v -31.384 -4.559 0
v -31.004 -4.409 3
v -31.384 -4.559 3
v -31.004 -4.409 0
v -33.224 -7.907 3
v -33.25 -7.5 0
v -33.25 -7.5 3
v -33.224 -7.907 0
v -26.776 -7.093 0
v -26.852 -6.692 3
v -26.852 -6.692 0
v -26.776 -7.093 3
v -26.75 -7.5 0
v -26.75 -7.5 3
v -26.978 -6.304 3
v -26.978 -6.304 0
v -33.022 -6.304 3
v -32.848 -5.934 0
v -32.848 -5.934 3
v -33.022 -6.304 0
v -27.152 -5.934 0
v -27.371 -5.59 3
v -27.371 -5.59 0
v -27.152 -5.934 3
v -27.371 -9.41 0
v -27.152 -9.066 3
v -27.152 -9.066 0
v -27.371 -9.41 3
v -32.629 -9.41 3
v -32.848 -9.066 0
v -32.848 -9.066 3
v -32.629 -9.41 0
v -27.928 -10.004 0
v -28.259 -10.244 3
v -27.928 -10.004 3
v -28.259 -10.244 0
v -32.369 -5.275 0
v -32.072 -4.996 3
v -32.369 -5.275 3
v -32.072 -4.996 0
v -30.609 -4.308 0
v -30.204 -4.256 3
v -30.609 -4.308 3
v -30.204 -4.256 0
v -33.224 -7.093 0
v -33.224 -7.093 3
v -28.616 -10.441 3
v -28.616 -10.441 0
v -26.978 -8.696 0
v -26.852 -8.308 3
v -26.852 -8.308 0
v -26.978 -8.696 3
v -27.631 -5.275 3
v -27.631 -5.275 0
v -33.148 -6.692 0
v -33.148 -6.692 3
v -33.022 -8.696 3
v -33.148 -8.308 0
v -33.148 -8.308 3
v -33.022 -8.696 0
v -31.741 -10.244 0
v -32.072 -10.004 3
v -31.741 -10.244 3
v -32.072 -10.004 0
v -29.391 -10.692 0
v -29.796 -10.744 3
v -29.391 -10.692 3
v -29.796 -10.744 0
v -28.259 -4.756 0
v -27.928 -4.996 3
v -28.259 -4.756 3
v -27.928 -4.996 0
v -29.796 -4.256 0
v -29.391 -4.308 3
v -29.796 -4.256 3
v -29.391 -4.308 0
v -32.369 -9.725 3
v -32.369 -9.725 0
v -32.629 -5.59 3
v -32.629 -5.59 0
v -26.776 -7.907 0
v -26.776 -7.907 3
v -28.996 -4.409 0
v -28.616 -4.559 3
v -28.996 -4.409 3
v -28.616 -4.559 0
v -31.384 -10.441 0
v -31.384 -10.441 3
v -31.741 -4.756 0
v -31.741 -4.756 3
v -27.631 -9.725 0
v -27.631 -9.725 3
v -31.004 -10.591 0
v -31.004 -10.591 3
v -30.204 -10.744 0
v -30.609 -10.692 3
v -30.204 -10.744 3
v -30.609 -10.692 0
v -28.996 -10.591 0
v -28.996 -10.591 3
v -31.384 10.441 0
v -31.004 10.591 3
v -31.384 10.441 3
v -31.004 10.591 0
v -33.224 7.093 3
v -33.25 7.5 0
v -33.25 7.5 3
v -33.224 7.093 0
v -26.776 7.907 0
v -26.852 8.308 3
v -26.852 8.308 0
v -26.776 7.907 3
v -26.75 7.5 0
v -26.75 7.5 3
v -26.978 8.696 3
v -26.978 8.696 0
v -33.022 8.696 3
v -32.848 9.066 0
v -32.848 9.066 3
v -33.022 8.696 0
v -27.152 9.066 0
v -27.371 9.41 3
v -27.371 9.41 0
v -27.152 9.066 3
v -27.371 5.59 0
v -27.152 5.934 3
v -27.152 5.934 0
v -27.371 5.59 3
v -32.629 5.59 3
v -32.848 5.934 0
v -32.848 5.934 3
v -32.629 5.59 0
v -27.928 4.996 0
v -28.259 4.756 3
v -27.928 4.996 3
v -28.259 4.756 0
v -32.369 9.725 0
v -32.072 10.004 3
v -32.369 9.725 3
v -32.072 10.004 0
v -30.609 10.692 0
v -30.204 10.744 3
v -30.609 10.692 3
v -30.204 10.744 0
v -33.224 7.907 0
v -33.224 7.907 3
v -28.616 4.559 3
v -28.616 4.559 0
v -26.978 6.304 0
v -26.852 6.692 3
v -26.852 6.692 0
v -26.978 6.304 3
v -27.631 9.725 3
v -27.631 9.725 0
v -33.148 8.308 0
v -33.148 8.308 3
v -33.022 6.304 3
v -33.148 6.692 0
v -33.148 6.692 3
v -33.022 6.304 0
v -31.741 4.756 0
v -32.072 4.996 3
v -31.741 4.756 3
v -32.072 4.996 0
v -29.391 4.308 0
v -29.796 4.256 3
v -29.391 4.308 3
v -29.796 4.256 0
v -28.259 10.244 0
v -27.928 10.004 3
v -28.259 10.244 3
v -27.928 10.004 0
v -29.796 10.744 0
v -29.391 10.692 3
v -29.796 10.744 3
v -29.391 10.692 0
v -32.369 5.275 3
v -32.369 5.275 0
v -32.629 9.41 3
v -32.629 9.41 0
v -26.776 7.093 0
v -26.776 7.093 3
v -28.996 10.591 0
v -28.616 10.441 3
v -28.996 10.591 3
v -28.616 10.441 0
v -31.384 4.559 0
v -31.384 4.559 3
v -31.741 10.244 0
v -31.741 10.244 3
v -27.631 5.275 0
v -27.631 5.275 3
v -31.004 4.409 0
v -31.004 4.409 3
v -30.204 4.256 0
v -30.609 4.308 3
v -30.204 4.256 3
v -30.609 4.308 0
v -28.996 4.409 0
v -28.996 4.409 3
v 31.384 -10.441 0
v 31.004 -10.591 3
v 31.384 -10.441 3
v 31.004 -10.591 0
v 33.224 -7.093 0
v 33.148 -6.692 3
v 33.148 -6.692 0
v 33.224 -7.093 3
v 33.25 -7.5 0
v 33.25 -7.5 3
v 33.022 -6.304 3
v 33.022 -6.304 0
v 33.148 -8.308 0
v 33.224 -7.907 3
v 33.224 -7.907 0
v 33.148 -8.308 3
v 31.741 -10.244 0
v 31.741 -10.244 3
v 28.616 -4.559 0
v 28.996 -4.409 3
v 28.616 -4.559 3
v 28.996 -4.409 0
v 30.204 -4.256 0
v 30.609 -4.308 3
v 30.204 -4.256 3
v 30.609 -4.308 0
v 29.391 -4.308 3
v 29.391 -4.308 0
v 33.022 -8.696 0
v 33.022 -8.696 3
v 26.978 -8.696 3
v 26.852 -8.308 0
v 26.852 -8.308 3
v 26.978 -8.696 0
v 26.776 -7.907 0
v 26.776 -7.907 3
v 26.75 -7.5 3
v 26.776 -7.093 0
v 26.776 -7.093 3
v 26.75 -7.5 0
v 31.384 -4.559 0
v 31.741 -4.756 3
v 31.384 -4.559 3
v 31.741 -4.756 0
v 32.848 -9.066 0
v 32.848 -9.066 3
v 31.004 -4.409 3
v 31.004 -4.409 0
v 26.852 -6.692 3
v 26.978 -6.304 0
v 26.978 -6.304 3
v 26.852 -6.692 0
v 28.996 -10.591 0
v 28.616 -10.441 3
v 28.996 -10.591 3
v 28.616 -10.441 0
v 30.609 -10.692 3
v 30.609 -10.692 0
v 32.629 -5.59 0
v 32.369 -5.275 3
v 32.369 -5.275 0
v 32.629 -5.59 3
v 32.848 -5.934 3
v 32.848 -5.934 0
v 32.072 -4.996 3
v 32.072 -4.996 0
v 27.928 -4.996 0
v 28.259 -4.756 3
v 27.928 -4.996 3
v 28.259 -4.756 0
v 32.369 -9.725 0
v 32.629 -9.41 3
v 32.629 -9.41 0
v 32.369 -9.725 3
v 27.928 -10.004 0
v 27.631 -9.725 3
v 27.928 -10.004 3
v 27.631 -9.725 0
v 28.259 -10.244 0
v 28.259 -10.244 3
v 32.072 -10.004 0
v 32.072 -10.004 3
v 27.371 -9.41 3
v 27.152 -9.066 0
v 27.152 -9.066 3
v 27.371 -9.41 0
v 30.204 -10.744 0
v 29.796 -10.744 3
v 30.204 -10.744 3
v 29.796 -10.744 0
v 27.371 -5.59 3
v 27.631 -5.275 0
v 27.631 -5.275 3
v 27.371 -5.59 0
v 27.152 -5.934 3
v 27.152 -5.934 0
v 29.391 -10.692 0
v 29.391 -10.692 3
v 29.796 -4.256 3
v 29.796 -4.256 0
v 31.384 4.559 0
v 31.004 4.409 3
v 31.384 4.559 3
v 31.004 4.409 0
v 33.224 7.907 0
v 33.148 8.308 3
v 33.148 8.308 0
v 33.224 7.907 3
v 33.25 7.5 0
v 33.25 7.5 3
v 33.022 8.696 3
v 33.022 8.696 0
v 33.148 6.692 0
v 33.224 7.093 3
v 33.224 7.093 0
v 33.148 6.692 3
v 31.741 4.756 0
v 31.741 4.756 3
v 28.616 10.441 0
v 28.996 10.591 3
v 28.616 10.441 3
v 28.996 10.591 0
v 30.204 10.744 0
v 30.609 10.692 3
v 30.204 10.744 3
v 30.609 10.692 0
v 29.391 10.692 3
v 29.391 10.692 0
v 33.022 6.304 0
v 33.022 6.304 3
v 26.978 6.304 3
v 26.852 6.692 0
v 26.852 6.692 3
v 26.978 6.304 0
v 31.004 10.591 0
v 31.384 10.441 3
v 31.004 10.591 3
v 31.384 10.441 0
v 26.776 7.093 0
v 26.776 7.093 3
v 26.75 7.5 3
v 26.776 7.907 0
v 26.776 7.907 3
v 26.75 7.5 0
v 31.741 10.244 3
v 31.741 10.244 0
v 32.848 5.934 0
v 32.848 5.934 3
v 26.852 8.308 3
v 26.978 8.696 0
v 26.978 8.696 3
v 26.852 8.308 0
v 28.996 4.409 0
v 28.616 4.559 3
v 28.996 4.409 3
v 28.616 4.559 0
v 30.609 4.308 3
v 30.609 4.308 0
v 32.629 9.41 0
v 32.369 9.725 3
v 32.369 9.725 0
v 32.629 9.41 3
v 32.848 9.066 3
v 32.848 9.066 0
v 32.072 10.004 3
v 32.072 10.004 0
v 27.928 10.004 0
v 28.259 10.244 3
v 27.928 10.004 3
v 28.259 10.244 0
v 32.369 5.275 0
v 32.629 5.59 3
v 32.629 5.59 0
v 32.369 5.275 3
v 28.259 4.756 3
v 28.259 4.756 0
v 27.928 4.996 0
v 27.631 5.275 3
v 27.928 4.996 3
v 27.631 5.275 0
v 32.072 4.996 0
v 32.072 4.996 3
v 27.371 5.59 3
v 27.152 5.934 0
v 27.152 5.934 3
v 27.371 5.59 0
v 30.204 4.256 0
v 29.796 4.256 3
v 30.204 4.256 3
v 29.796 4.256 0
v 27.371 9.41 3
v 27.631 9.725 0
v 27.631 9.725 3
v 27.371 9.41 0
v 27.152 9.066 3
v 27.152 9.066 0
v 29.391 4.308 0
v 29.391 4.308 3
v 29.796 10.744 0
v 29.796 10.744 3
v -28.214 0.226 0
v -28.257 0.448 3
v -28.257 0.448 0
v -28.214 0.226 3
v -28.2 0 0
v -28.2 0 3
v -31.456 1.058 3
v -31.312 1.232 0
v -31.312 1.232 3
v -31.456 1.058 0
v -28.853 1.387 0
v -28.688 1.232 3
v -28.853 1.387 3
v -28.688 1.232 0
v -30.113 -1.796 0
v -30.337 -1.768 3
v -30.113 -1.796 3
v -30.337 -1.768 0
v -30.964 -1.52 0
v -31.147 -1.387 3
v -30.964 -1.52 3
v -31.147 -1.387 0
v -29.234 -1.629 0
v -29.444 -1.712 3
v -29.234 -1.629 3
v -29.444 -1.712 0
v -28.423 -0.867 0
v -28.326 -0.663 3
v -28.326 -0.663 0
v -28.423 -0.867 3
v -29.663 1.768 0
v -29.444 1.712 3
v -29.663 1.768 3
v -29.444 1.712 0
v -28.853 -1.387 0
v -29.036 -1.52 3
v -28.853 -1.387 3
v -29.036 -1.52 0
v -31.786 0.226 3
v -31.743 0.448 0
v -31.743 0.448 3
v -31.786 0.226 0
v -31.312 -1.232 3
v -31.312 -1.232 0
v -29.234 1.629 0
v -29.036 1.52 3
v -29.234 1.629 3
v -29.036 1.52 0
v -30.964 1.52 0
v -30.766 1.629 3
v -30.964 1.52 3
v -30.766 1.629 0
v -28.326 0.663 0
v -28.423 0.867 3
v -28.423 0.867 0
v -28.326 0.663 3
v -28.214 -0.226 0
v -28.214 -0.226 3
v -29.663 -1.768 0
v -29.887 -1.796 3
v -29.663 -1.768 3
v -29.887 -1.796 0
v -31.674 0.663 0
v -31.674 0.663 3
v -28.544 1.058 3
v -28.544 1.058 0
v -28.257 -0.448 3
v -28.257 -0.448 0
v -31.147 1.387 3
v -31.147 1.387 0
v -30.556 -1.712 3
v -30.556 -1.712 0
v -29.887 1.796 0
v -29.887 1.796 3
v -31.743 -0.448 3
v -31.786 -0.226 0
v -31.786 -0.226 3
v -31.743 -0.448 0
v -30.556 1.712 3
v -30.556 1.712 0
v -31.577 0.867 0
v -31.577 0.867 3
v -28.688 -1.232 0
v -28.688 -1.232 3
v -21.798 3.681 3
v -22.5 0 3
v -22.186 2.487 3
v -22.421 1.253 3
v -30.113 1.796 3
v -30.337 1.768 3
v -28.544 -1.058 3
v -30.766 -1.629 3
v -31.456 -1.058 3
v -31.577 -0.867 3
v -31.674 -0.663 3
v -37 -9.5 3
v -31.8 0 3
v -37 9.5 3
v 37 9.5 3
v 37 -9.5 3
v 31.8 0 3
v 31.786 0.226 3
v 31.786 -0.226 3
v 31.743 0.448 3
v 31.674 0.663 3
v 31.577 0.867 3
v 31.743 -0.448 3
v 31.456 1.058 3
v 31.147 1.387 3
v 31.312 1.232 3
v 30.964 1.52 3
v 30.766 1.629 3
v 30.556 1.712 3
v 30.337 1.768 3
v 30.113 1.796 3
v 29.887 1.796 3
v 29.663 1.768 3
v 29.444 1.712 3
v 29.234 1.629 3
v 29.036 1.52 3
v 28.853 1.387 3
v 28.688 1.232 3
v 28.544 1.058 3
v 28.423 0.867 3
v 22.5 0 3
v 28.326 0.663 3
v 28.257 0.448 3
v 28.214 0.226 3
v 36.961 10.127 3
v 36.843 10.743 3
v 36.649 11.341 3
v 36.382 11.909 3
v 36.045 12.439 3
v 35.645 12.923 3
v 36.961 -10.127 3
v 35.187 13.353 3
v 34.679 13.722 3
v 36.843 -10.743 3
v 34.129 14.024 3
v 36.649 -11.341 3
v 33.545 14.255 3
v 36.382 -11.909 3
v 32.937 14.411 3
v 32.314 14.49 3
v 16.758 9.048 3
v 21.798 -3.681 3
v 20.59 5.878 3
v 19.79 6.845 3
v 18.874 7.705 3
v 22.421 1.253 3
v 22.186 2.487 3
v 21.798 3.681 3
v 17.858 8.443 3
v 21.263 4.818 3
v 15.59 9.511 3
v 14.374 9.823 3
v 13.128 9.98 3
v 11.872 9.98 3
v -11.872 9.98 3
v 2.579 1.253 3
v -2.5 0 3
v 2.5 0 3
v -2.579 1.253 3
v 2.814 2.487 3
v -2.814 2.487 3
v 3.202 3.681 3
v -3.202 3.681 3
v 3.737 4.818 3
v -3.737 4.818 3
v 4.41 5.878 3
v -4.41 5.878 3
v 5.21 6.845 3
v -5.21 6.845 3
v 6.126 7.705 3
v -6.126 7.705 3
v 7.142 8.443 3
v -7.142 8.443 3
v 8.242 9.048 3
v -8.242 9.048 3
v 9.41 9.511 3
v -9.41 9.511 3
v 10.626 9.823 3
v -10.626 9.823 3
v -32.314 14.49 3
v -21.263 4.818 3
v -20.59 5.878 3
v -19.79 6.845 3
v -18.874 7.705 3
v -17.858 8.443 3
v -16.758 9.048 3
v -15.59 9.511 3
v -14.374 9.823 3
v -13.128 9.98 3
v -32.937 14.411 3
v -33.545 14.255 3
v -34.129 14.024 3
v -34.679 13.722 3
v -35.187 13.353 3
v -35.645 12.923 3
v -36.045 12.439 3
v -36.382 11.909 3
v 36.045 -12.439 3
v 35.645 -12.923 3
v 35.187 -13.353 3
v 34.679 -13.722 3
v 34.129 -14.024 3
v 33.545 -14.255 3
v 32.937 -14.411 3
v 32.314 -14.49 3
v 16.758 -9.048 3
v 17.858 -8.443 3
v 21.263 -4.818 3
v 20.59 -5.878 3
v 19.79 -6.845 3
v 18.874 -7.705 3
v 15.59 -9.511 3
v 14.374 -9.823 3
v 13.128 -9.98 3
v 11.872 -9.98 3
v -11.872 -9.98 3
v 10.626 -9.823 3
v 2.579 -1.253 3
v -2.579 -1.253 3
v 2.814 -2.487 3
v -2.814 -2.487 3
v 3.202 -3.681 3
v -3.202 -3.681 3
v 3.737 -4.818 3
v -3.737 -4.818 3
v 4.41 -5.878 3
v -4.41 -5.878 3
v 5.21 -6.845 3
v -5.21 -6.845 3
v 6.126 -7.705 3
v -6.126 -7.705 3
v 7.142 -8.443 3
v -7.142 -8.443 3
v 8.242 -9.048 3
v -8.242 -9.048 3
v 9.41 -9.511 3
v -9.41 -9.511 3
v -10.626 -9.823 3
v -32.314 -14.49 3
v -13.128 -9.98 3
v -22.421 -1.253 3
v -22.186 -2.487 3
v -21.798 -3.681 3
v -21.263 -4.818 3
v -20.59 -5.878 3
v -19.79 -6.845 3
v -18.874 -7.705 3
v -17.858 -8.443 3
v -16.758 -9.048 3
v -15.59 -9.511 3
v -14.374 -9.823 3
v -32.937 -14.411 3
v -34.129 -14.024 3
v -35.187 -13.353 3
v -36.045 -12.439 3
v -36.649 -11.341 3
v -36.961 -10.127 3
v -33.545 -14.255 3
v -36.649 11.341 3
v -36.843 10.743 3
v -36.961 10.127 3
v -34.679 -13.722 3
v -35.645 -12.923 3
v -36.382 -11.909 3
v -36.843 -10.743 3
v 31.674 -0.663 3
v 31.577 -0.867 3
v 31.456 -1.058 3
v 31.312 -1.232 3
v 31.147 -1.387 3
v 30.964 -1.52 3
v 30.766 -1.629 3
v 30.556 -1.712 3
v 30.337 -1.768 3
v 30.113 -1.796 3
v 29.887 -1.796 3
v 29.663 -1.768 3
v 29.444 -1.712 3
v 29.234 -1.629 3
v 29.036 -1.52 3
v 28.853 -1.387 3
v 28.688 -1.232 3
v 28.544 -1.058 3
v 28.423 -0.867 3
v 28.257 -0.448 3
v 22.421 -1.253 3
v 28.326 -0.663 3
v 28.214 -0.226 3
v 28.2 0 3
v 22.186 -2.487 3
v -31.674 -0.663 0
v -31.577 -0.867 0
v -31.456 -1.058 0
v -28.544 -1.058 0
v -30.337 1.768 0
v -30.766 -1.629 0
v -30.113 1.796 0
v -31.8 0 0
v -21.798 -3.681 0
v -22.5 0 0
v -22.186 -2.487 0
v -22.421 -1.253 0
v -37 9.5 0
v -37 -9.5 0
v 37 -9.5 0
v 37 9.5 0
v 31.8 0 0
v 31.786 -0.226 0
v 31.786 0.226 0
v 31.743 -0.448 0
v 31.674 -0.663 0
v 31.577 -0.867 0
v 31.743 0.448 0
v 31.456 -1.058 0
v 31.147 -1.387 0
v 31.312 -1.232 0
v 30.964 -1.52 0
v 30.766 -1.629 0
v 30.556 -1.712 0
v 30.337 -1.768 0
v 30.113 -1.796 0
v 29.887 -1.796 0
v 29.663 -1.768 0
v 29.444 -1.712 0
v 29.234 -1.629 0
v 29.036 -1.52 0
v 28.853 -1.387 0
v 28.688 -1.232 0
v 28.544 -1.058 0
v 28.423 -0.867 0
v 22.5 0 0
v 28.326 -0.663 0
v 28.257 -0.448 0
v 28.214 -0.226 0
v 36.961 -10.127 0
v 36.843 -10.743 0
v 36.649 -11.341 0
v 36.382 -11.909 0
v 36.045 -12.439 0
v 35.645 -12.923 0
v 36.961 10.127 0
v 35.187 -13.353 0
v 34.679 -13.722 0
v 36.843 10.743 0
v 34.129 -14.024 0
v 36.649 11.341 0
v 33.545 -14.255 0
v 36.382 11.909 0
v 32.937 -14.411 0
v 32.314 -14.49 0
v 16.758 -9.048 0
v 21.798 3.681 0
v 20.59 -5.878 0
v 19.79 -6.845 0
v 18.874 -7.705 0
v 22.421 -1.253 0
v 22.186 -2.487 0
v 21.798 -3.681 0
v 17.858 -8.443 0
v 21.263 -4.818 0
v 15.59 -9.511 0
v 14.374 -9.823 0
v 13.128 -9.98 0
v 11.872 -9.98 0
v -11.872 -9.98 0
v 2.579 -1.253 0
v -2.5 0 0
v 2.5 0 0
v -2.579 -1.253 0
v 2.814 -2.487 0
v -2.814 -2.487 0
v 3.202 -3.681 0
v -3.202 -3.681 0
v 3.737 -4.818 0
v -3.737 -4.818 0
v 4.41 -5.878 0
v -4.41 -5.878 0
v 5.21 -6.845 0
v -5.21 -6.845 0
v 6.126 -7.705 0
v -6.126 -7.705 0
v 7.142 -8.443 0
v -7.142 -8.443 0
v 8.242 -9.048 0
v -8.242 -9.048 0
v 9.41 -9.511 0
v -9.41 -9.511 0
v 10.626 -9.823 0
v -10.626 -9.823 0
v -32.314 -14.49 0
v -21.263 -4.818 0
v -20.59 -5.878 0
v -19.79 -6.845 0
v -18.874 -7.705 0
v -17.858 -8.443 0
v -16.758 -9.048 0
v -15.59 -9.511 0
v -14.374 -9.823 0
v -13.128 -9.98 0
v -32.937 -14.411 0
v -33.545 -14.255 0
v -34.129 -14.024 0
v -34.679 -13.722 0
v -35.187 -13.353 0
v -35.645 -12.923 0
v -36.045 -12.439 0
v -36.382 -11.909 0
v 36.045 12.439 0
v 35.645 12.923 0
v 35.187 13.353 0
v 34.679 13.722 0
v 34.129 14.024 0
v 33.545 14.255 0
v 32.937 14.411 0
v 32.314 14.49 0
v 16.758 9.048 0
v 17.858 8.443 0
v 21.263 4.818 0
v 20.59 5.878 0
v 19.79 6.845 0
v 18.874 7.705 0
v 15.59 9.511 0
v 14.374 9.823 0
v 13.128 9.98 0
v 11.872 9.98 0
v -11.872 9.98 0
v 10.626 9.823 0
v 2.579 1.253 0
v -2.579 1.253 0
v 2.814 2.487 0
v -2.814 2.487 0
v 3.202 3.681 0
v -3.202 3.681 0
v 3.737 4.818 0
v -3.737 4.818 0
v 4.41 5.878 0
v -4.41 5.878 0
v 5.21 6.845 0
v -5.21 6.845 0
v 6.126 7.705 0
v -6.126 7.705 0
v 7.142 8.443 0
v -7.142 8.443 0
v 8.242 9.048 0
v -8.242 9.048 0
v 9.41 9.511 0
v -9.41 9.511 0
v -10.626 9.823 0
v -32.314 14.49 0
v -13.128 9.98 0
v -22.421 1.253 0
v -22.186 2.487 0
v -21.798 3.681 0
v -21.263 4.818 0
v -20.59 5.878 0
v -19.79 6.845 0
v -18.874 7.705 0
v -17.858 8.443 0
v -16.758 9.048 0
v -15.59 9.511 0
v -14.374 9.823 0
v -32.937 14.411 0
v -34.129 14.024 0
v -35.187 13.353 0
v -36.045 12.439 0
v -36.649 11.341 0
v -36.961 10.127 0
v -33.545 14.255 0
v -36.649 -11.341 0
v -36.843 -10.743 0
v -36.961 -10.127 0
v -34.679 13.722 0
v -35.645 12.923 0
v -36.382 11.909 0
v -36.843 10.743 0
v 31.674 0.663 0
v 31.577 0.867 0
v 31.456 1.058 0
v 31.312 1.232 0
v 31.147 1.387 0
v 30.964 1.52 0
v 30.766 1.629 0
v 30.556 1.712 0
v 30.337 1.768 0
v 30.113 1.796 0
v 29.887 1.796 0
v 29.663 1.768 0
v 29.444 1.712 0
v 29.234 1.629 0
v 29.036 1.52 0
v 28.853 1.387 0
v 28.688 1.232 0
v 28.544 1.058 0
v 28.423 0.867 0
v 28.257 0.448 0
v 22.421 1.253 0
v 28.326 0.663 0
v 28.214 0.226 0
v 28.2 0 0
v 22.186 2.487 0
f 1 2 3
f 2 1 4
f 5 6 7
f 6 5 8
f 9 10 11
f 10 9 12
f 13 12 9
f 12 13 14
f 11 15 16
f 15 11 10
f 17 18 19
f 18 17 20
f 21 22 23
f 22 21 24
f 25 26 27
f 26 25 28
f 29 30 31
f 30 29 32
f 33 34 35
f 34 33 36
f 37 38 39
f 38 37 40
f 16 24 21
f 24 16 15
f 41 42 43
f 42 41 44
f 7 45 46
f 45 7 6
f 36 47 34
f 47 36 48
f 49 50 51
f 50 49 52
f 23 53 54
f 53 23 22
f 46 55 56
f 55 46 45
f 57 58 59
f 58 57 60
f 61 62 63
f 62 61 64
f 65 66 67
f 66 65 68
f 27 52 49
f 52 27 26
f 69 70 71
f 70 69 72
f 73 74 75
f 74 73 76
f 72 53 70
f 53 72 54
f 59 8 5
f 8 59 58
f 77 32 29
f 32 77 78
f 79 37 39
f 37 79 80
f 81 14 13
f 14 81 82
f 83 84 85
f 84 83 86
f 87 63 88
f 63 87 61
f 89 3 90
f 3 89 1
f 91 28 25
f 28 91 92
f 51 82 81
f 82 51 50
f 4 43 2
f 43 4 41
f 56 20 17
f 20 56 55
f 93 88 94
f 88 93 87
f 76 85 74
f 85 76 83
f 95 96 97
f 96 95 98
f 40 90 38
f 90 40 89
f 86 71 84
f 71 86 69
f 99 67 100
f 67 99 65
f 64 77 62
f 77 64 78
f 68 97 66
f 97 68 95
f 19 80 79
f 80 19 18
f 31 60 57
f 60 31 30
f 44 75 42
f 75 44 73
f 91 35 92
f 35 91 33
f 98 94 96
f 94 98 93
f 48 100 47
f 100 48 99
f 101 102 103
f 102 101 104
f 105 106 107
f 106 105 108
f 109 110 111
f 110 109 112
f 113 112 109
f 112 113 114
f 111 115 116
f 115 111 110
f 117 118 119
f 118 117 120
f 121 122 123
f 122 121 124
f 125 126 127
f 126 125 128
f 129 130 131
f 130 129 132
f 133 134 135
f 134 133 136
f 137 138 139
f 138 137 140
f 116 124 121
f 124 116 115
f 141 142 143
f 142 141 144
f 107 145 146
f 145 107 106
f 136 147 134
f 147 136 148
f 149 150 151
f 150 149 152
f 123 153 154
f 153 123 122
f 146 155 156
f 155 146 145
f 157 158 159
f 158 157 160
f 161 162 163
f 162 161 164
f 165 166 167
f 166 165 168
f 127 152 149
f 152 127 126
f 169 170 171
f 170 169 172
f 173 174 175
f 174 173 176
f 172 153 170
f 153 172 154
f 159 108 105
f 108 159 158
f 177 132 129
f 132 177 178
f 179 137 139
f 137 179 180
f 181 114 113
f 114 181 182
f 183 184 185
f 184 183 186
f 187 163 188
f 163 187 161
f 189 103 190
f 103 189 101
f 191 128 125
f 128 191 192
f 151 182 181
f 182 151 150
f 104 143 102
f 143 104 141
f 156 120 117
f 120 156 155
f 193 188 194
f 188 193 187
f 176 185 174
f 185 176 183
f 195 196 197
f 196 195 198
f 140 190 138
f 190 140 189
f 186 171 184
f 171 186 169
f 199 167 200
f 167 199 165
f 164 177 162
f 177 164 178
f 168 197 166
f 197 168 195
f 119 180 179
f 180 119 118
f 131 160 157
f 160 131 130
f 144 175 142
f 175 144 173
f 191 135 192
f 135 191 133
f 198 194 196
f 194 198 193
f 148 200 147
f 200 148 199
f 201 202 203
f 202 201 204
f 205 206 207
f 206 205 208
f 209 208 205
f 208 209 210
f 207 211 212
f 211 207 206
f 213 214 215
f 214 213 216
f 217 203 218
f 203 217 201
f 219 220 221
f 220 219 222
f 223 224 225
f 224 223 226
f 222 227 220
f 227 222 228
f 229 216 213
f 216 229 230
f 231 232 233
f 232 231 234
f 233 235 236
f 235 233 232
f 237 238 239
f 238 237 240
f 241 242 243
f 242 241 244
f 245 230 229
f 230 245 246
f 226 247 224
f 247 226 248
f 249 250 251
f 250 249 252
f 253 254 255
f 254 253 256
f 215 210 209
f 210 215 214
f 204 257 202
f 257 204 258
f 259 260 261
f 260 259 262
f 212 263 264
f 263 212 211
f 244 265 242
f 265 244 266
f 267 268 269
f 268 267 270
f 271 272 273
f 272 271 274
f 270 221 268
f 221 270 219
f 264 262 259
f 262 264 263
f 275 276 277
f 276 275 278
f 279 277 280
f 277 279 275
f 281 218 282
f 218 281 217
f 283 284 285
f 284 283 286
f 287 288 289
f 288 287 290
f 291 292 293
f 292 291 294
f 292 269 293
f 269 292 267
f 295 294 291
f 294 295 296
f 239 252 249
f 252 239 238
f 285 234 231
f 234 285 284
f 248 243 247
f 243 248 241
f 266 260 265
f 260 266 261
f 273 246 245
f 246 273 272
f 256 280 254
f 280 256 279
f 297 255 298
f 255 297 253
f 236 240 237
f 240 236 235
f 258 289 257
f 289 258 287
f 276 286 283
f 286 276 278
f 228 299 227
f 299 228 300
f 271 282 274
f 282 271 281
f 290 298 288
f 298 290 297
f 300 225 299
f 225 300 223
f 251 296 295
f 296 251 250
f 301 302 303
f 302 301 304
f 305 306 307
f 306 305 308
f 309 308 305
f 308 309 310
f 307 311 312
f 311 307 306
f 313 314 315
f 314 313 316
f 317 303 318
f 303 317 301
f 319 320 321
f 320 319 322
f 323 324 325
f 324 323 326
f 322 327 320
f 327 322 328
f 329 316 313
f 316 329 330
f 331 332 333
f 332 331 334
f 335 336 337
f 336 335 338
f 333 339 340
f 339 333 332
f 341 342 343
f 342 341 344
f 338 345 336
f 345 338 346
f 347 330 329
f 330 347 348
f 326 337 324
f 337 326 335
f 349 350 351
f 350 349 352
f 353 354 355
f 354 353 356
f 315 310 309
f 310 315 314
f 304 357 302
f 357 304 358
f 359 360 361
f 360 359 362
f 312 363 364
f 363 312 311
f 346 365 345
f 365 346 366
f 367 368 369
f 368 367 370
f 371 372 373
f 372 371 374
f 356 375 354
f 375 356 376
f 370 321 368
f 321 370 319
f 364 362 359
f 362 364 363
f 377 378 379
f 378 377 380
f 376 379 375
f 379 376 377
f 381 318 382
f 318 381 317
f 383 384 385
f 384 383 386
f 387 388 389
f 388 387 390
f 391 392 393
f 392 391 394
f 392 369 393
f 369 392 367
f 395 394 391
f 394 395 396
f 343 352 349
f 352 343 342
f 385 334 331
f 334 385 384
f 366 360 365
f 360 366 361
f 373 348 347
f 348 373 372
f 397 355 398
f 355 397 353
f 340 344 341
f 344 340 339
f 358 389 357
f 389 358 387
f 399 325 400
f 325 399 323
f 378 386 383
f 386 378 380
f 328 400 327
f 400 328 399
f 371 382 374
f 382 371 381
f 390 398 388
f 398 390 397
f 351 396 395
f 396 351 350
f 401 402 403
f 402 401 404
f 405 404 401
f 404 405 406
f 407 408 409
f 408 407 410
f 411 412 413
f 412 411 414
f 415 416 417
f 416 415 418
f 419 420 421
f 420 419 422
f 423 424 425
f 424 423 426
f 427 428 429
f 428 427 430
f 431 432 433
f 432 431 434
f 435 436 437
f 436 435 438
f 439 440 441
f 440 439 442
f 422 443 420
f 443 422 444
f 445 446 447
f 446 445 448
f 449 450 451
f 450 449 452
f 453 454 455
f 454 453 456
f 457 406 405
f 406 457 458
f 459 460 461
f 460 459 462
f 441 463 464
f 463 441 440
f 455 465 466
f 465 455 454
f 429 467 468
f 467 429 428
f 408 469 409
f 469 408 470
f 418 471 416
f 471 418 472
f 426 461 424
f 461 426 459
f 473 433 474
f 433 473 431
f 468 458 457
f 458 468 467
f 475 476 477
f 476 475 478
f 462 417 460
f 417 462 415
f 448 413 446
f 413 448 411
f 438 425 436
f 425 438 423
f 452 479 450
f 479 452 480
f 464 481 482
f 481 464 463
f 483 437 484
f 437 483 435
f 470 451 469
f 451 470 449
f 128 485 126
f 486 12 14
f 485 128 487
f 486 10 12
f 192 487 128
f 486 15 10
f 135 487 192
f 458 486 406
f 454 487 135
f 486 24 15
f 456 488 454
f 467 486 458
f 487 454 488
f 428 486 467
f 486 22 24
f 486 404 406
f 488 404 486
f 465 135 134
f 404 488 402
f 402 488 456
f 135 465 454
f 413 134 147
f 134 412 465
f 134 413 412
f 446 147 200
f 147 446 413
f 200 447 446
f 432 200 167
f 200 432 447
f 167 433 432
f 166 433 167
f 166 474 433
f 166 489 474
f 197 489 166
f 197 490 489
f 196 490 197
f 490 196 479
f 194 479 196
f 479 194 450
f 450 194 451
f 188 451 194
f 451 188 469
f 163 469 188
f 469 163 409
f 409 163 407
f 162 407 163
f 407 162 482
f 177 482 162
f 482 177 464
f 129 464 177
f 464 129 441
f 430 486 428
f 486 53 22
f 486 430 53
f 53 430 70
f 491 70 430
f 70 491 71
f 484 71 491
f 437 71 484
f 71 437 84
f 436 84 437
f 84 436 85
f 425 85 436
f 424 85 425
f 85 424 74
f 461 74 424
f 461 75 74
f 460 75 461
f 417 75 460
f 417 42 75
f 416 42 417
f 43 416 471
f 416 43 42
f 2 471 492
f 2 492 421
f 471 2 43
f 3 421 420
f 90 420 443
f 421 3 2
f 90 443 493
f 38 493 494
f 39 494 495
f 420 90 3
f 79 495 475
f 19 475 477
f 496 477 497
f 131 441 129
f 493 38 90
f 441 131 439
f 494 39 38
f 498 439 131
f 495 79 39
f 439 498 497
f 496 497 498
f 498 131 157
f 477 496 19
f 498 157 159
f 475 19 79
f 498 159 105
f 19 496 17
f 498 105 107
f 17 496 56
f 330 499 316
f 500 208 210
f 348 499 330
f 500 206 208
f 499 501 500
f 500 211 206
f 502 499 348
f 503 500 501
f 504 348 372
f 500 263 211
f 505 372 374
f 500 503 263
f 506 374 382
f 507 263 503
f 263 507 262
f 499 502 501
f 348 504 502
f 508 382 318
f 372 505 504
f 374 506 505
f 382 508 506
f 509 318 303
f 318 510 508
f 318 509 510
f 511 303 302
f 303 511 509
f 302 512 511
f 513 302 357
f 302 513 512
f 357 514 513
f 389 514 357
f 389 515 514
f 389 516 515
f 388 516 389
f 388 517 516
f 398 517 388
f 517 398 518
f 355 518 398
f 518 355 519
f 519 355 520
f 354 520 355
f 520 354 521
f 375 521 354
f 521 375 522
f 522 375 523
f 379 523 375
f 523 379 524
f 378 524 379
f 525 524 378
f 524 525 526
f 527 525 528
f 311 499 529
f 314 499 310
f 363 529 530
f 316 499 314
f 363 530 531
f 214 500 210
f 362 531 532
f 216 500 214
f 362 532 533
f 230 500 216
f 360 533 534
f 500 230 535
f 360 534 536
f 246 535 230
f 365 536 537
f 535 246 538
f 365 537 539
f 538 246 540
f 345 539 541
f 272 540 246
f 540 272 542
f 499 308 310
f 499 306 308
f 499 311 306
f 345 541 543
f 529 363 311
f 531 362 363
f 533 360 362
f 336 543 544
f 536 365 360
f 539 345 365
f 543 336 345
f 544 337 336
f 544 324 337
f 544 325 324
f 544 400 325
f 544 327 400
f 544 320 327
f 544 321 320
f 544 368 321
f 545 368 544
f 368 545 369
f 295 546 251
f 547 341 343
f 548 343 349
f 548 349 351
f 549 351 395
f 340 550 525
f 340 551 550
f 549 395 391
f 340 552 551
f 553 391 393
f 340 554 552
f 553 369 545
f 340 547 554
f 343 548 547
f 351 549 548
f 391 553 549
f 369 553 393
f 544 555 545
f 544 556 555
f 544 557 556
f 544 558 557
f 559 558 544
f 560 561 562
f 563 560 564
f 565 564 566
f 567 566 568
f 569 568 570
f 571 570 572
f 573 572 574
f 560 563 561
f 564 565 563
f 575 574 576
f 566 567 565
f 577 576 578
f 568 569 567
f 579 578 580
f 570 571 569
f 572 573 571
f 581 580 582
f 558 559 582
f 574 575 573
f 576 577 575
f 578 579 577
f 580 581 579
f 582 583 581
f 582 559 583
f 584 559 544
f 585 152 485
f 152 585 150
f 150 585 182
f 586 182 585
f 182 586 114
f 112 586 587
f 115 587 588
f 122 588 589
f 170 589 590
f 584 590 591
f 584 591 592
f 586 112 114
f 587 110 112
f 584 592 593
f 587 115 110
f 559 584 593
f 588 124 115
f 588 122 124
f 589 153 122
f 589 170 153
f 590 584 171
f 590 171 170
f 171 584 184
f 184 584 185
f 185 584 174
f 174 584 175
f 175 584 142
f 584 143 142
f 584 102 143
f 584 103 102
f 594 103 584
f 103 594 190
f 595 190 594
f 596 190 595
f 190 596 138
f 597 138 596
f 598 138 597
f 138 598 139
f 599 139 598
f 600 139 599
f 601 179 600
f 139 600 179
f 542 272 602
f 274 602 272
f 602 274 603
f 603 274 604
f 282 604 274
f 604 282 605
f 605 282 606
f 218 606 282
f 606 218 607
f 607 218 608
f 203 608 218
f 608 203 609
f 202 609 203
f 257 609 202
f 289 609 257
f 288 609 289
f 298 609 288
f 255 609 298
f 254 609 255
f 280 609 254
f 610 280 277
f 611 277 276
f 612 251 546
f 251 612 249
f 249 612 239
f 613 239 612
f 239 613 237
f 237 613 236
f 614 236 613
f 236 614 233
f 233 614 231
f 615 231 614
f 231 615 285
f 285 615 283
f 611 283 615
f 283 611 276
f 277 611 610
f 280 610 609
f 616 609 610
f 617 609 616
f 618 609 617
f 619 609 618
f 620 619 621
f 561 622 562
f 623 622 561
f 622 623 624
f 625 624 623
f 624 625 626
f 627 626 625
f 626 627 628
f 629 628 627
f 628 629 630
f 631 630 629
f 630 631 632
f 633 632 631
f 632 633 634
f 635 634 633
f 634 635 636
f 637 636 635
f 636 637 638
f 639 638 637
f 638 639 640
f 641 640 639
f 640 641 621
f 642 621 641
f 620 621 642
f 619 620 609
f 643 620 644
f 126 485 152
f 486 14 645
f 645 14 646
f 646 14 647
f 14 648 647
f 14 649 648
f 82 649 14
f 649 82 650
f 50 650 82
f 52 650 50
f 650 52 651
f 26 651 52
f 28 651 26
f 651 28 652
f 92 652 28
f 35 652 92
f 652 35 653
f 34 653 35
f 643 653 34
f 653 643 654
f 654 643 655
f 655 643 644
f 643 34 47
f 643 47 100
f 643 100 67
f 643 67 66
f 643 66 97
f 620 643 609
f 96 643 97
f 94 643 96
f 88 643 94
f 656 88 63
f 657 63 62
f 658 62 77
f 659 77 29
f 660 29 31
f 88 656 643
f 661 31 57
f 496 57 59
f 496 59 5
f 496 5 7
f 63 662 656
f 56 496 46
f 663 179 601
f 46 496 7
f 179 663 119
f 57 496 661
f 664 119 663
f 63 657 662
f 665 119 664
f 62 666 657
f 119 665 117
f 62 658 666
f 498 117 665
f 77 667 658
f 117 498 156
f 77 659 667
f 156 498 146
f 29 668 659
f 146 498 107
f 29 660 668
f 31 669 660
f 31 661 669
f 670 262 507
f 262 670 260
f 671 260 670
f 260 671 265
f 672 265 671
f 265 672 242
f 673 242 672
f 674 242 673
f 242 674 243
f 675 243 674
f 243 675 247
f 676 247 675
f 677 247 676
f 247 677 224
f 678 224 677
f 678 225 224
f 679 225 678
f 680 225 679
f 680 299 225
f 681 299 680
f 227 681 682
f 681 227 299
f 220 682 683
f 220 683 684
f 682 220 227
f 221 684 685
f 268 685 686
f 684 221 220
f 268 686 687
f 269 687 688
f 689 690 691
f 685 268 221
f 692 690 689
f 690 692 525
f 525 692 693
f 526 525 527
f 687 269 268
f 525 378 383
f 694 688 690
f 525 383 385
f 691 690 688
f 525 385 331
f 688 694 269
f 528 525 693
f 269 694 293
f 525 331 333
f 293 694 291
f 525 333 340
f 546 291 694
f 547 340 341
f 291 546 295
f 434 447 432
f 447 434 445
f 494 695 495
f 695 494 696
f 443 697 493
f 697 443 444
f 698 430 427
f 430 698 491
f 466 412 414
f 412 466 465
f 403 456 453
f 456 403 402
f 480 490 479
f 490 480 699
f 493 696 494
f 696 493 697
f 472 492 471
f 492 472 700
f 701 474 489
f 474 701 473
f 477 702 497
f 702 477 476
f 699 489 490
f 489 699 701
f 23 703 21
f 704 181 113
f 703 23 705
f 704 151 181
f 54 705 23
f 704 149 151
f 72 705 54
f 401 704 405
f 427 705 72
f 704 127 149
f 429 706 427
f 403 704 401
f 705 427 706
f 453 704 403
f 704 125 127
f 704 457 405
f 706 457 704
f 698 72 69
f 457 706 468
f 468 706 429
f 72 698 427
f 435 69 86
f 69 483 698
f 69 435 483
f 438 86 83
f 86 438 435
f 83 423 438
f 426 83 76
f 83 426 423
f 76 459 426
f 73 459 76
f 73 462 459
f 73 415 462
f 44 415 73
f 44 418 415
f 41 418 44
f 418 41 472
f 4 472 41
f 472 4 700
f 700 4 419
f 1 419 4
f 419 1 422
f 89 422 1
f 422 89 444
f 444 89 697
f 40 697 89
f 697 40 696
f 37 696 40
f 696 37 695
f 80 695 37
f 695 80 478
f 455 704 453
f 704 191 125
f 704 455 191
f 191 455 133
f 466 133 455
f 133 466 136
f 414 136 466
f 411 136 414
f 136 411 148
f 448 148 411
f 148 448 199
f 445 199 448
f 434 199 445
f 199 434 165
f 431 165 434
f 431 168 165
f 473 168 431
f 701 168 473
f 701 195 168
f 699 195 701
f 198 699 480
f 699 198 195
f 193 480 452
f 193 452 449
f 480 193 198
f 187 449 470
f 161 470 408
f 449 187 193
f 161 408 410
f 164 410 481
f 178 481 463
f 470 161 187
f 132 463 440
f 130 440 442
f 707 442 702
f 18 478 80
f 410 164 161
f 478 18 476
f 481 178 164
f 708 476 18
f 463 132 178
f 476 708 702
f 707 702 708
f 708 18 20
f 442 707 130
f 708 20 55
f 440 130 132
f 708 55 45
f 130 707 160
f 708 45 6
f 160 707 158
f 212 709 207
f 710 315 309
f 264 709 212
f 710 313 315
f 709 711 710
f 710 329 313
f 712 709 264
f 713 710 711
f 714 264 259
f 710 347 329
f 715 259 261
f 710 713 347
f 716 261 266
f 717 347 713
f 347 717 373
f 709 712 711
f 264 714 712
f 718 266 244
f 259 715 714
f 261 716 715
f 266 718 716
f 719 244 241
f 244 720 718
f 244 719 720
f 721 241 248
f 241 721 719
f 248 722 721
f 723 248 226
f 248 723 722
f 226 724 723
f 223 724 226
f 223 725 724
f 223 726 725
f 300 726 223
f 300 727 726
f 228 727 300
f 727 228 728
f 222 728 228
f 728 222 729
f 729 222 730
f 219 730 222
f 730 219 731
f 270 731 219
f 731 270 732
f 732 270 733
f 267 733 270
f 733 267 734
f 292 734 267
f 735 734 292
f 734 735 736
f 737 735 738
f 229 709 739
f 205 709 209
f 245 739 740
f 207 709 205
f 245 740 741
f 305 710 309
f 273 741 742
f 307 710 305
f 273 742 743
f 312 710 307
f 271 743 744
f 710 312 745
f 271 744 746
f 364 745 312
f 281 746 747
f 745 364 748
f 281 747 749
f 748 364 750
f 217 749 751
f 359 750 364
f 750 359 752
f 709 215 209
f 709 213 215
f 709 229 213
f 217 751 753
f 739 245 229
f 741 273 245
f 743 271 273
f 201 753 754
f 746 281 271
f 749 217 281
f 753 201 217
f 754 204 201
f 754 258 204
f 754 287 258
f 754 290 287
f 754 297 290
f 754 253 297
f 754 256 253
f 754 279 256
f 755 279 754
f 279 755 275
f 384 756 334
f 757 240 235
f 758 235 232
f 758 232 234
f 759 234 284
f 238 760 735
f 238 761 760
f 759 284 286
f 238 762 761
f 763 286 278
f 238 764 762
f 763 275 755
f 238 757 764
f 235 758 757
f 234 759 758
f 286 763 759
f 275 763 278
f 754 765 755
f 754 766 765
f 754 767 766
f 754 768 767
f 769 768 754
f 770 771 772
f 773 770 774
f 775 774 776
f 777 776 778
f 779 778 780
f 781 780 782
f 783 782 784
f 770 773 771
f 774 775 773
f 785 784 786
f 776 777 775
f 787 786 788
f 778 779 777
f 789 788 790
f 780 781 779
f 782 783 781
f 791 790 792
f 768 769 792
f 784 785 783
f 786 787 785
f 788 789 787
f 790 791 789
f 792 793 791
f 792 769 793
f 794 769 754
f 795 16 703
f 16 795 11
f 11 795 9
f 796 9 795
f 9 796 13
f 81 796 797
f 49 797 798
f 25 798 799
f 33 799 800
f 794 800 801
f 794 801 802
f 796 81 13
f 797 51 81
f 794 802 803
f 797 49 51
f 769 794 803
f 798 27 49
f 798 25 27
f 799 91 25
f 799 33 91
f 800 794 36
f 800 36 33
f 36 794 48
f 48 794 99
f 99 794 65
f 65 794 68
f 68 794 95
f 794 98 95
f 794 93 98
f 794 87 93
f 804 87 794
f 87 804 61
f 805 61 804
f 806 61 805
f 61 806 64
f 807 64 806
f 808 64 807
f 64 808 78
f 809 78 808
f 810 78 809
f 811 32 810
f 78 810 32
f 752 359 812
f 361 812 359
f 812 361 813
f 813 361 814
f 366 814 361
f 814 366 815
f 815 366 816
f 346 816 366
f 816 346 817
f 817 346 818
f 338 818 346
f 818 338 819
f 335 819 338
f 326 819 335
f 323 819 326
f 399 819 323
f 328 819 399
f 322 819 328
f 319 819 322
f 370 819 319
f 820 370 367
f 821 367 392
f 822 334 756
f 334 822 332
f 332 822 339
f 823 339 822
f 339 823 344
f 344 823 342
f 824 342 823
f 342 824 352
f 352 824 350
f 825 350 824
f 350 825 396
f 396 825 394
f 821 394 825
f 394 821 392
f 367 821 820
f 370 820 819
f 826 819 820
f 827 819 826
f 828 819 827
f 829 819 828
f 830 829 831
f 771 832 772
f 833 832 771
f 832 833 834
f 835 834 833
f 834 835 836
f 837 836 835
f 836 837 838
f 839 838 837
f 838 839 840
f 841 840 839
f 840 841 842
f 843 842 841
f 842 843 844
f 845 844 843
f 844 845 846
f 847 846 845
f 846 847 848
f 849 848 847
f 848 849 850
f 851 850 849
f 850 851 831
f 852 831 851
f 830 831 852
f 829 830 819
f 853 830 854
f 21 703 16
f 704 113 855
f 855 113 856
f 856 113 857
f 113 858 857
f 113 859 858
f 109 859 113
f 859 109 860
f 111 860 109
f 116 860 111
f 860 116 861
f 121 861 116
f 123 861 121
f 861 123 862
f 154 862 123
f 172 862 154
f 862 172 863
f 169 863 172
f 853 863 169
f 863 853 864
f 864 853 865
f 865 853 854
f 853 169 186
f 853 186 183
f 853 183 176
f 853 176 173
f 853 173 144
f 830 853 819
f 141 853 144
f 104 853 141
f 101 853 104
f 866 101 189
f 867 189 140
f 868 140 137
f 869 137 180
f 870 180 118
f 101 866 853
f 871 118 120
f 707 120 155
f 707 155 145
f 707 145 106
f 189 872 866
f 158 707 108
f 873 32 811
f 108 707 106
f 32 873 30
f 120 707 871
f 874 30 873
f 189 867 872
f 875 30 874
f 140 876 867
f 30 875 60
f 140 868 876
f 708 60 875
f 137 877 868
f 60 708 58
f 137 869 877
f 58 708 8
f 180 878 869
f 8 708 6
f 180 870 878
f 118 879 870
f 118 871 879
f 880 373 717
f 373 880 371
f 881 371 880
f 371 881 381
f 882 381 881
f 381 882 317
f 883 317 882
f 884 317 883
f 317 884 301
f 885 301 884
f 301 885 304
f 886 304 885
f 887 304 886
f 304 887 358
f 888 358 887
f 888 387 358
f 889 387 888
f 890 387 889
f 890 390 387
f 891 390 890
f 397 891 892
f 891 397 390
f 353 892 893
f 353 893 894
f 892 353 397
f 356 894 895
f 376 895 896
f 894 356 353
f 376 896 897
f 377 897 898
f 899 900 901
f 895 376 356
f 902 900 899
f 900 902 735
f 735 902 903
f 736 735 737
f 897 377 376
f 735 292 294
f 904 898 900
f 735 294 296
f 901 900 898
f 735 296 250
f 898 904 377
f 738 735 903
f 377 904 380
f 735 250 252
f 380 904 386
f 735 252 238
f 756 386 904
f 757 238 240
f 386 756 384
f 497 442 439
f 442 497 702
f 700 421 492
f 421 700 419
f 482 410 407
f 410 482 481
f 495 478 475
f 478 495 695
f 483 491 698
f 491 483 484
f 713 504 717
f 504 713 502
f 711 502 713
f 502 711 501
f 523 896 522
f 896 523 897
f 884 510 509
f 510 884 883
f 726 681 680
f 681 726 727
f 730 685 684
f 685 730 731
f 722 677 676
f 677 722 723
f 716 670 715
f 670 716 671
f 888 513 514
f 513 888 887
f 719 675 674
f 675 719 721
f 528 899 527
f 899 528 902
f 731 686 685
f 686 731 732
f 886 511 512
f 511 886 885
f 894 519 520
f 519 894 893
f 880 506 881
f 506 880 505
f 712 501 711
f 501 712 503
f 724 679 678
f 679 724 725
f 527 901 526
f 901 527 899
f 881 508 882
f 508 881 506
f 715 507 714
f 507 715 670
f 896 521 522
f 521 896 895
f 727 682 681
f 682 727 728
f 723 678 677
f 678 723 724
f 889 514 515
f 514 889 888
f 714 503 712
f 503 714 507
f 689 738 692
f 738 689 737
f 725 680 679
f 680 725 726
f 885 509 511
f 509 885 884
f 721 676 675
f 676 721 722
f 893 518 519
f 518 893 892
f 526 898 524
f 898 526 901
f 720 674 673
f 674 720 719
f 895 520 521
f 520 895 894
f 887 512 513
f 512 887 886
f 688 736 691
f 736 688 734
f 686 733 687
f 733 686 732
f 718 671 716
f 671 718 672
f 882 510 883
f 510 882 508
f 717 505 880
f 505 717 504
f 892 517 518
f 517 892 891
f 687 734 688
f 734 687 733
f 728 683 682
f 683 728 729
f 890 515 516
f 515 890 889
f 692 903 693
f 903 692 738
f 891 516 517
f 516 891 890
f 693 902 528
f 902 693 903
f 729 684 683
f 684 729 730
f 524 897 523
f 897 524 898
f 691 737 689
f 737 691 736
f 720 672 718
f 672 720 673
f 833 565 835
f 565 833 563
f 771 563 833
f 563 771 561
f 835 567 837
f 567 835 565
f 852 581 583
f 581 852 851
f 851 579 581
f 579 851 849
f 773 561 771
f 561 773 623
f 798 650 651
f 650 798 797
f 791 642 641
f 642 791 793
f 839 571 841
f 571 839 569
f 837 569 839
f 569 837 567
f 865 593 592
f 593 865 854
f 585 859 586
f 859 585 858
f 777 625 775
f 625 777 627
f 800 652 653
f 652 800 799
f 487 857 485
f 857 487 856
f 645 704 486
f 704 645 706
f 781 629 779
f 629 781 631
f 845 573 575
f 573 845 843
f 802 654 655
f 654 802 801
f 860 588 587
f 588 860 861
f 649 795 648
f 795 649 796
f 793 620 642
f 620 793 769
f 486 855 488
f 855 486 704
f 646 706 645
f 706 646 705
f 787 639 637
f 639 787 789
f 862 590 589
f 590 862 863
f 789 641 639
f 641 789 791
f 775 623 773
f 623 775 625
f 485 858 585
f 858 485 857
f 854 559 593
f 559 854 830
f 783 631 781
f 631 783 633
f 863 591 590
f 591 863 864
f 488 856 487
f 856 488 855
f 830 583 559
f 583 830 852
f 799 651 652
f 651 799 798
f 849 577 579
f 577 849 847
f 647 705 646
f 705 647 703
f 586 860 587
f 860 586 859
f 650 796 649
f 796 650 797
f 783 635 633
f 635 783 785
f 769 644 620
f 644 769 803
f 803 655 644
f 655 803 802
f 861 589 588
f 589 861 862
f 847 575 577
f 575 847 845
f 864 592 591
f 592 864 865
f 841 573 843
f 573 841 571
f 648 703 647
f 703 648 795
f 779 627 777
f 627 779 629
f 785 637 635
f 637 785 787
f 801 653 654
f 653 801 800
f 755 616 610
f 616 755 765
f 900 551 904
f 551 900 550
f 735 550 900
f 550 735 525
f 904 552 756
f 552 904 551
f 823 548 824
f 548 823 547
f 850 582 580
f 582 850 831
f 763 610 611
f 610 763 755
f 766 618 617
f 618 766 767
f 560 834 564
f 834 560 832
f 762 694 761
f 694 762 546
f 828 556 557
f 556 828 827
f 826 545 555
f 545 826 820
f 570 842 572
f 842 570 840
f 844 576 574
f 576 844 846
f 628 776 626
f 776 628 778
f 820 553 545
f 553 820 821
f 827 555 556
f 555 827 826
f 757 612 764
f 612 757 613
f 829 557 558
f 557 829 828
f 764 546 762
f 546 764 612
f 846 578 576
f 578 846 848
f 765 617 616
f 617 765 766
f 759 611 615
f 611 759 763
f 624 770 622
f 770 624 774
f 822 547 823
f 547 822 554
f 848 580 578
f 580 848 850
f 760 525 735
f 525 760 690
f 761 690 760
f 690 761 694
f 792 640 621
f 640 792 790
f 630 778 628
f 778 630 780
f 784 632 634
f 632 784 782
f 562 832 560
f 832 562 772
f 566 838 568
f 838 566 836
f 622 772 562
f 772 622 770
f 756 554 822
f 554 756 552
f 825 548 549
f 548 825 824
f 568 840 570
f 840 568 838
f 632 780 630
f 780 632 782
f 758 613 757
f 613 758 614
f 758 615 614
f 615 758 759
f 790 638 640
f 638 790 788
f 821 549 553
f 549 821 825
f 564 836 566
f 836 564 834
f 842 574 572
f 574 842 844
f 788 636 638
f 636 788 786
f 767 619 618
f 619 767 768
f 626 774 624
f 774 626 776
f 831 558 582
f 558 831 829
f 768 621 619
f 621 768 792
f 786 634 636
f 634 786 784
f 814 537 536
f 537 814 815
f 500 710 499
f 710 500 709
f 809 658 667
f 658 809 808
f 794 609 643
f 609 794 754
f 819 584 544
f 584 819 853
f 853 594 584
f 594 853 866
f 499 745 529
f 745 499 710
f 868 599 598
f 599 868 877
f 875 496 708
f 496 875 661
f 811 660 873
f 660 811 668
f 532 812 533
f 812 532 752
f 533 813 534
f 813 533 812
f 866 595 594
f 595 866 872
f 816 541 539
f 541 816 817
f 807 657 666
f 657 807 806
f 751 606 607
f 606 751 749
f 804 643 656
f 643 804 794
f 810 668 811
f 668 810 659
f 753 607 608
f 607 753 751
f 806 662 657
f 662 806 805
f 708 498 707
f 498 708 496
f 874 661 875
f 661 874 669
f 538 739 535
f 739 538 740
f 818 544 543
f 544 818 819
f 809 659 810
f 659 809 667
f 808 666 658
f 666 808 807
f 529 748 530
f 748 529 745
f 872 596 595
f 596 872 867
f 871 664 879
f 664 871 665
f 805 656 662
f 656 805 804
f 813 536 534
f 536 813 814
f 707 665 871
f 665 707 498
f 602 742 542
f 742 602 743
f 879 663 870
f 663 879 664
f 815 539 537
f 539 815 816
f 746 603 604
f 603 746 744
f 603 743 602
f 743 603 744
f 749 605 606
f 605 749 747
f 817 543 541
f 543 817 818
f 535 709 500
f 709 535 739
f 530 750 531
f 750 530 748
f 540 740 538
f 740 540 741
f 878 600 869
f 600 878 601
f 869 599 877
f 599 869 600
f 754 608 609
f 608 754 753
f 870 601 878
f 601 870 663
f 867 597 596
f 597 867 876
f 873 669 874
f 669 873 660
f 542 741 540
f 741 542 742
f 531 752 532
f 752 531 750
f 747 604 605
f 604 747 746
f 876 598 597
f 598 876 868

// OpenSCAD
$fn = 50;


difference() {
	union() {
		hull() {
			translate(v = [-32.0000000000, 9.5000000000, 0]) {
				cylinder(h = 3, r = 5);
			}
			translate(v = [32.0000000000, 9.5000000000, 0]) {
				cylinder(h = 3, r = 5);
			}
			translate(v = [-32.0000000000, -9.5000000000, 0]) {
				cylinder(h = 3, r = 5);
			}
			translate(v = [32.0000000000, -9.5000000000, 0]) {
				cylinder(h = 3, r = 5);
			}
		}
	}
	union() {
		#translate(v = [-30.0000000000, -7.5000000000, 0]) {
			cylinder(h = 3, r = 3.2500000000);
		}
		#translate(v = [-30.0000000000, 7.5000000000, 0]) {
			cylinder(h = 3, r = 3.2500000000);
		}
		#translate(v = [30.0000000000, -7.5000000000, 0]) {
			cylinder(h = 3, r = 3.2500000000);
		}
		#translate(v = [30.0000000000, 7.5000000000, 0]) {
			cylinder(h = 3, r = 3.2500000000);
		}
		#translate(v = [-30.0000000000, -7.5000000000, -100.0000000000]) {
			cylinder(h = 200, r = 3.2500000000);
		}
		#translate(v = [-30.0000000000, 7.5000000000, -100.0000000000]) {
			cylinder(h = 200, r = 3.2500000000);
		}
		#translate(v = [30.0000000000, -7.5000000000, -100.0000000000]) {
			cylinder(h = 200, r = 3.2500000000);
		}
		#translate(v = [30.0000000000, 7.5000000000, -100.0000000000]) {
			cylinder(h = 200, r = 3.2500000000);
		}
		#translate(v = [-30.0000000000, -7.5000000000, 0]) {
			cylinder(h = 3, r = 1.8000000000);
		}
		#translate(v = [-30.0000000000, 0.0000000000, 0]) {
			cylinder(h = 3, r = 1.8000000000);
		}
		#translate(v = [-30.0000000000, 7.5000000000, 0]) {
			cylinder(h = 3, r = 1.8000000000);
		}
		#translate(v = [30.0000000000, -7.5000000000, 0]) {
			cylinder(h = 3, r = 1.8000000000);
		}
		#translate(v = [30.0000000000, 0.0000000000, 0]) {
			cylinder(h = 3, r = 1.8000000000);
		}
		#translate(v = [30.0000000000, 7.5000000000, 0]) {
			cylinder(h = 3, r = 1.8000000000);
		}
		#translate(v = [-30.0000000000, -7.5000000000, 0]) {
			cylinder(h = 3, r = 1.8000000000);
		}
		#translate(v = [-30.0000000000, 0.0000000000, 0]) {
			cylinder(h = 3, r = 1.8000000000);
		}
		#translate(v = [-30.0000000000, 7.5000000000, 0]) {
			cylinder(h = 3, r = 1.8000000000);
		}
		#translate(v = [30.0000000000, -7.5000000000, 0]) {
			cylinder(h = 3, r = 1.8000000000);
		}
		#translate(v = [30.0000000000, 0.0000000000, 0]) {
			cylinder(h = 3, r = 1.8000000000);
		}
		#translate(v = [30.0000000000, 7.5000000000, 0]) {
			cylinder(h = 3, r = 1.8000000000);
		}
		#translate(v = [-30.0000000000, -7.5000000000, 0]) {
			cylinder(h = 3, r = 1.8000000000);
		}
		#translate(v = [-30.0000000000, 0.0000000000, 0]) {
			cylinder(h = 3, r = 1.8000000000);
		}
		#translate(v = [-30.0000000000, 7.5000000000, 0]) {
			cylinder(h = 3, r = 1.8000000000);
		}
		#translate(v = [30.0000000000, -7.5000000000, 0]) {
			cylinder(h = 3, r = 1.8000000000);
		}
		#translate(v = [30.0000000000, 0.0000000000, 0]) {
			cylinder(h = 3, r = 1.8000000000);
		}
		#translate(v = [30.0000000000, 7.5000000000, 0]) {
			cylinder(h = 3, r = 1.8000000000);
		}
		#translate(v = [-12.5000000000, 0, 0]) {
			cylinder(h = 3, r = 10.0000000000);
		}
		#translate(v = [12.5000000000, 0, 0]) {
			cylinder(h = 3, r = 10.0000000000);
		}
	}
}
